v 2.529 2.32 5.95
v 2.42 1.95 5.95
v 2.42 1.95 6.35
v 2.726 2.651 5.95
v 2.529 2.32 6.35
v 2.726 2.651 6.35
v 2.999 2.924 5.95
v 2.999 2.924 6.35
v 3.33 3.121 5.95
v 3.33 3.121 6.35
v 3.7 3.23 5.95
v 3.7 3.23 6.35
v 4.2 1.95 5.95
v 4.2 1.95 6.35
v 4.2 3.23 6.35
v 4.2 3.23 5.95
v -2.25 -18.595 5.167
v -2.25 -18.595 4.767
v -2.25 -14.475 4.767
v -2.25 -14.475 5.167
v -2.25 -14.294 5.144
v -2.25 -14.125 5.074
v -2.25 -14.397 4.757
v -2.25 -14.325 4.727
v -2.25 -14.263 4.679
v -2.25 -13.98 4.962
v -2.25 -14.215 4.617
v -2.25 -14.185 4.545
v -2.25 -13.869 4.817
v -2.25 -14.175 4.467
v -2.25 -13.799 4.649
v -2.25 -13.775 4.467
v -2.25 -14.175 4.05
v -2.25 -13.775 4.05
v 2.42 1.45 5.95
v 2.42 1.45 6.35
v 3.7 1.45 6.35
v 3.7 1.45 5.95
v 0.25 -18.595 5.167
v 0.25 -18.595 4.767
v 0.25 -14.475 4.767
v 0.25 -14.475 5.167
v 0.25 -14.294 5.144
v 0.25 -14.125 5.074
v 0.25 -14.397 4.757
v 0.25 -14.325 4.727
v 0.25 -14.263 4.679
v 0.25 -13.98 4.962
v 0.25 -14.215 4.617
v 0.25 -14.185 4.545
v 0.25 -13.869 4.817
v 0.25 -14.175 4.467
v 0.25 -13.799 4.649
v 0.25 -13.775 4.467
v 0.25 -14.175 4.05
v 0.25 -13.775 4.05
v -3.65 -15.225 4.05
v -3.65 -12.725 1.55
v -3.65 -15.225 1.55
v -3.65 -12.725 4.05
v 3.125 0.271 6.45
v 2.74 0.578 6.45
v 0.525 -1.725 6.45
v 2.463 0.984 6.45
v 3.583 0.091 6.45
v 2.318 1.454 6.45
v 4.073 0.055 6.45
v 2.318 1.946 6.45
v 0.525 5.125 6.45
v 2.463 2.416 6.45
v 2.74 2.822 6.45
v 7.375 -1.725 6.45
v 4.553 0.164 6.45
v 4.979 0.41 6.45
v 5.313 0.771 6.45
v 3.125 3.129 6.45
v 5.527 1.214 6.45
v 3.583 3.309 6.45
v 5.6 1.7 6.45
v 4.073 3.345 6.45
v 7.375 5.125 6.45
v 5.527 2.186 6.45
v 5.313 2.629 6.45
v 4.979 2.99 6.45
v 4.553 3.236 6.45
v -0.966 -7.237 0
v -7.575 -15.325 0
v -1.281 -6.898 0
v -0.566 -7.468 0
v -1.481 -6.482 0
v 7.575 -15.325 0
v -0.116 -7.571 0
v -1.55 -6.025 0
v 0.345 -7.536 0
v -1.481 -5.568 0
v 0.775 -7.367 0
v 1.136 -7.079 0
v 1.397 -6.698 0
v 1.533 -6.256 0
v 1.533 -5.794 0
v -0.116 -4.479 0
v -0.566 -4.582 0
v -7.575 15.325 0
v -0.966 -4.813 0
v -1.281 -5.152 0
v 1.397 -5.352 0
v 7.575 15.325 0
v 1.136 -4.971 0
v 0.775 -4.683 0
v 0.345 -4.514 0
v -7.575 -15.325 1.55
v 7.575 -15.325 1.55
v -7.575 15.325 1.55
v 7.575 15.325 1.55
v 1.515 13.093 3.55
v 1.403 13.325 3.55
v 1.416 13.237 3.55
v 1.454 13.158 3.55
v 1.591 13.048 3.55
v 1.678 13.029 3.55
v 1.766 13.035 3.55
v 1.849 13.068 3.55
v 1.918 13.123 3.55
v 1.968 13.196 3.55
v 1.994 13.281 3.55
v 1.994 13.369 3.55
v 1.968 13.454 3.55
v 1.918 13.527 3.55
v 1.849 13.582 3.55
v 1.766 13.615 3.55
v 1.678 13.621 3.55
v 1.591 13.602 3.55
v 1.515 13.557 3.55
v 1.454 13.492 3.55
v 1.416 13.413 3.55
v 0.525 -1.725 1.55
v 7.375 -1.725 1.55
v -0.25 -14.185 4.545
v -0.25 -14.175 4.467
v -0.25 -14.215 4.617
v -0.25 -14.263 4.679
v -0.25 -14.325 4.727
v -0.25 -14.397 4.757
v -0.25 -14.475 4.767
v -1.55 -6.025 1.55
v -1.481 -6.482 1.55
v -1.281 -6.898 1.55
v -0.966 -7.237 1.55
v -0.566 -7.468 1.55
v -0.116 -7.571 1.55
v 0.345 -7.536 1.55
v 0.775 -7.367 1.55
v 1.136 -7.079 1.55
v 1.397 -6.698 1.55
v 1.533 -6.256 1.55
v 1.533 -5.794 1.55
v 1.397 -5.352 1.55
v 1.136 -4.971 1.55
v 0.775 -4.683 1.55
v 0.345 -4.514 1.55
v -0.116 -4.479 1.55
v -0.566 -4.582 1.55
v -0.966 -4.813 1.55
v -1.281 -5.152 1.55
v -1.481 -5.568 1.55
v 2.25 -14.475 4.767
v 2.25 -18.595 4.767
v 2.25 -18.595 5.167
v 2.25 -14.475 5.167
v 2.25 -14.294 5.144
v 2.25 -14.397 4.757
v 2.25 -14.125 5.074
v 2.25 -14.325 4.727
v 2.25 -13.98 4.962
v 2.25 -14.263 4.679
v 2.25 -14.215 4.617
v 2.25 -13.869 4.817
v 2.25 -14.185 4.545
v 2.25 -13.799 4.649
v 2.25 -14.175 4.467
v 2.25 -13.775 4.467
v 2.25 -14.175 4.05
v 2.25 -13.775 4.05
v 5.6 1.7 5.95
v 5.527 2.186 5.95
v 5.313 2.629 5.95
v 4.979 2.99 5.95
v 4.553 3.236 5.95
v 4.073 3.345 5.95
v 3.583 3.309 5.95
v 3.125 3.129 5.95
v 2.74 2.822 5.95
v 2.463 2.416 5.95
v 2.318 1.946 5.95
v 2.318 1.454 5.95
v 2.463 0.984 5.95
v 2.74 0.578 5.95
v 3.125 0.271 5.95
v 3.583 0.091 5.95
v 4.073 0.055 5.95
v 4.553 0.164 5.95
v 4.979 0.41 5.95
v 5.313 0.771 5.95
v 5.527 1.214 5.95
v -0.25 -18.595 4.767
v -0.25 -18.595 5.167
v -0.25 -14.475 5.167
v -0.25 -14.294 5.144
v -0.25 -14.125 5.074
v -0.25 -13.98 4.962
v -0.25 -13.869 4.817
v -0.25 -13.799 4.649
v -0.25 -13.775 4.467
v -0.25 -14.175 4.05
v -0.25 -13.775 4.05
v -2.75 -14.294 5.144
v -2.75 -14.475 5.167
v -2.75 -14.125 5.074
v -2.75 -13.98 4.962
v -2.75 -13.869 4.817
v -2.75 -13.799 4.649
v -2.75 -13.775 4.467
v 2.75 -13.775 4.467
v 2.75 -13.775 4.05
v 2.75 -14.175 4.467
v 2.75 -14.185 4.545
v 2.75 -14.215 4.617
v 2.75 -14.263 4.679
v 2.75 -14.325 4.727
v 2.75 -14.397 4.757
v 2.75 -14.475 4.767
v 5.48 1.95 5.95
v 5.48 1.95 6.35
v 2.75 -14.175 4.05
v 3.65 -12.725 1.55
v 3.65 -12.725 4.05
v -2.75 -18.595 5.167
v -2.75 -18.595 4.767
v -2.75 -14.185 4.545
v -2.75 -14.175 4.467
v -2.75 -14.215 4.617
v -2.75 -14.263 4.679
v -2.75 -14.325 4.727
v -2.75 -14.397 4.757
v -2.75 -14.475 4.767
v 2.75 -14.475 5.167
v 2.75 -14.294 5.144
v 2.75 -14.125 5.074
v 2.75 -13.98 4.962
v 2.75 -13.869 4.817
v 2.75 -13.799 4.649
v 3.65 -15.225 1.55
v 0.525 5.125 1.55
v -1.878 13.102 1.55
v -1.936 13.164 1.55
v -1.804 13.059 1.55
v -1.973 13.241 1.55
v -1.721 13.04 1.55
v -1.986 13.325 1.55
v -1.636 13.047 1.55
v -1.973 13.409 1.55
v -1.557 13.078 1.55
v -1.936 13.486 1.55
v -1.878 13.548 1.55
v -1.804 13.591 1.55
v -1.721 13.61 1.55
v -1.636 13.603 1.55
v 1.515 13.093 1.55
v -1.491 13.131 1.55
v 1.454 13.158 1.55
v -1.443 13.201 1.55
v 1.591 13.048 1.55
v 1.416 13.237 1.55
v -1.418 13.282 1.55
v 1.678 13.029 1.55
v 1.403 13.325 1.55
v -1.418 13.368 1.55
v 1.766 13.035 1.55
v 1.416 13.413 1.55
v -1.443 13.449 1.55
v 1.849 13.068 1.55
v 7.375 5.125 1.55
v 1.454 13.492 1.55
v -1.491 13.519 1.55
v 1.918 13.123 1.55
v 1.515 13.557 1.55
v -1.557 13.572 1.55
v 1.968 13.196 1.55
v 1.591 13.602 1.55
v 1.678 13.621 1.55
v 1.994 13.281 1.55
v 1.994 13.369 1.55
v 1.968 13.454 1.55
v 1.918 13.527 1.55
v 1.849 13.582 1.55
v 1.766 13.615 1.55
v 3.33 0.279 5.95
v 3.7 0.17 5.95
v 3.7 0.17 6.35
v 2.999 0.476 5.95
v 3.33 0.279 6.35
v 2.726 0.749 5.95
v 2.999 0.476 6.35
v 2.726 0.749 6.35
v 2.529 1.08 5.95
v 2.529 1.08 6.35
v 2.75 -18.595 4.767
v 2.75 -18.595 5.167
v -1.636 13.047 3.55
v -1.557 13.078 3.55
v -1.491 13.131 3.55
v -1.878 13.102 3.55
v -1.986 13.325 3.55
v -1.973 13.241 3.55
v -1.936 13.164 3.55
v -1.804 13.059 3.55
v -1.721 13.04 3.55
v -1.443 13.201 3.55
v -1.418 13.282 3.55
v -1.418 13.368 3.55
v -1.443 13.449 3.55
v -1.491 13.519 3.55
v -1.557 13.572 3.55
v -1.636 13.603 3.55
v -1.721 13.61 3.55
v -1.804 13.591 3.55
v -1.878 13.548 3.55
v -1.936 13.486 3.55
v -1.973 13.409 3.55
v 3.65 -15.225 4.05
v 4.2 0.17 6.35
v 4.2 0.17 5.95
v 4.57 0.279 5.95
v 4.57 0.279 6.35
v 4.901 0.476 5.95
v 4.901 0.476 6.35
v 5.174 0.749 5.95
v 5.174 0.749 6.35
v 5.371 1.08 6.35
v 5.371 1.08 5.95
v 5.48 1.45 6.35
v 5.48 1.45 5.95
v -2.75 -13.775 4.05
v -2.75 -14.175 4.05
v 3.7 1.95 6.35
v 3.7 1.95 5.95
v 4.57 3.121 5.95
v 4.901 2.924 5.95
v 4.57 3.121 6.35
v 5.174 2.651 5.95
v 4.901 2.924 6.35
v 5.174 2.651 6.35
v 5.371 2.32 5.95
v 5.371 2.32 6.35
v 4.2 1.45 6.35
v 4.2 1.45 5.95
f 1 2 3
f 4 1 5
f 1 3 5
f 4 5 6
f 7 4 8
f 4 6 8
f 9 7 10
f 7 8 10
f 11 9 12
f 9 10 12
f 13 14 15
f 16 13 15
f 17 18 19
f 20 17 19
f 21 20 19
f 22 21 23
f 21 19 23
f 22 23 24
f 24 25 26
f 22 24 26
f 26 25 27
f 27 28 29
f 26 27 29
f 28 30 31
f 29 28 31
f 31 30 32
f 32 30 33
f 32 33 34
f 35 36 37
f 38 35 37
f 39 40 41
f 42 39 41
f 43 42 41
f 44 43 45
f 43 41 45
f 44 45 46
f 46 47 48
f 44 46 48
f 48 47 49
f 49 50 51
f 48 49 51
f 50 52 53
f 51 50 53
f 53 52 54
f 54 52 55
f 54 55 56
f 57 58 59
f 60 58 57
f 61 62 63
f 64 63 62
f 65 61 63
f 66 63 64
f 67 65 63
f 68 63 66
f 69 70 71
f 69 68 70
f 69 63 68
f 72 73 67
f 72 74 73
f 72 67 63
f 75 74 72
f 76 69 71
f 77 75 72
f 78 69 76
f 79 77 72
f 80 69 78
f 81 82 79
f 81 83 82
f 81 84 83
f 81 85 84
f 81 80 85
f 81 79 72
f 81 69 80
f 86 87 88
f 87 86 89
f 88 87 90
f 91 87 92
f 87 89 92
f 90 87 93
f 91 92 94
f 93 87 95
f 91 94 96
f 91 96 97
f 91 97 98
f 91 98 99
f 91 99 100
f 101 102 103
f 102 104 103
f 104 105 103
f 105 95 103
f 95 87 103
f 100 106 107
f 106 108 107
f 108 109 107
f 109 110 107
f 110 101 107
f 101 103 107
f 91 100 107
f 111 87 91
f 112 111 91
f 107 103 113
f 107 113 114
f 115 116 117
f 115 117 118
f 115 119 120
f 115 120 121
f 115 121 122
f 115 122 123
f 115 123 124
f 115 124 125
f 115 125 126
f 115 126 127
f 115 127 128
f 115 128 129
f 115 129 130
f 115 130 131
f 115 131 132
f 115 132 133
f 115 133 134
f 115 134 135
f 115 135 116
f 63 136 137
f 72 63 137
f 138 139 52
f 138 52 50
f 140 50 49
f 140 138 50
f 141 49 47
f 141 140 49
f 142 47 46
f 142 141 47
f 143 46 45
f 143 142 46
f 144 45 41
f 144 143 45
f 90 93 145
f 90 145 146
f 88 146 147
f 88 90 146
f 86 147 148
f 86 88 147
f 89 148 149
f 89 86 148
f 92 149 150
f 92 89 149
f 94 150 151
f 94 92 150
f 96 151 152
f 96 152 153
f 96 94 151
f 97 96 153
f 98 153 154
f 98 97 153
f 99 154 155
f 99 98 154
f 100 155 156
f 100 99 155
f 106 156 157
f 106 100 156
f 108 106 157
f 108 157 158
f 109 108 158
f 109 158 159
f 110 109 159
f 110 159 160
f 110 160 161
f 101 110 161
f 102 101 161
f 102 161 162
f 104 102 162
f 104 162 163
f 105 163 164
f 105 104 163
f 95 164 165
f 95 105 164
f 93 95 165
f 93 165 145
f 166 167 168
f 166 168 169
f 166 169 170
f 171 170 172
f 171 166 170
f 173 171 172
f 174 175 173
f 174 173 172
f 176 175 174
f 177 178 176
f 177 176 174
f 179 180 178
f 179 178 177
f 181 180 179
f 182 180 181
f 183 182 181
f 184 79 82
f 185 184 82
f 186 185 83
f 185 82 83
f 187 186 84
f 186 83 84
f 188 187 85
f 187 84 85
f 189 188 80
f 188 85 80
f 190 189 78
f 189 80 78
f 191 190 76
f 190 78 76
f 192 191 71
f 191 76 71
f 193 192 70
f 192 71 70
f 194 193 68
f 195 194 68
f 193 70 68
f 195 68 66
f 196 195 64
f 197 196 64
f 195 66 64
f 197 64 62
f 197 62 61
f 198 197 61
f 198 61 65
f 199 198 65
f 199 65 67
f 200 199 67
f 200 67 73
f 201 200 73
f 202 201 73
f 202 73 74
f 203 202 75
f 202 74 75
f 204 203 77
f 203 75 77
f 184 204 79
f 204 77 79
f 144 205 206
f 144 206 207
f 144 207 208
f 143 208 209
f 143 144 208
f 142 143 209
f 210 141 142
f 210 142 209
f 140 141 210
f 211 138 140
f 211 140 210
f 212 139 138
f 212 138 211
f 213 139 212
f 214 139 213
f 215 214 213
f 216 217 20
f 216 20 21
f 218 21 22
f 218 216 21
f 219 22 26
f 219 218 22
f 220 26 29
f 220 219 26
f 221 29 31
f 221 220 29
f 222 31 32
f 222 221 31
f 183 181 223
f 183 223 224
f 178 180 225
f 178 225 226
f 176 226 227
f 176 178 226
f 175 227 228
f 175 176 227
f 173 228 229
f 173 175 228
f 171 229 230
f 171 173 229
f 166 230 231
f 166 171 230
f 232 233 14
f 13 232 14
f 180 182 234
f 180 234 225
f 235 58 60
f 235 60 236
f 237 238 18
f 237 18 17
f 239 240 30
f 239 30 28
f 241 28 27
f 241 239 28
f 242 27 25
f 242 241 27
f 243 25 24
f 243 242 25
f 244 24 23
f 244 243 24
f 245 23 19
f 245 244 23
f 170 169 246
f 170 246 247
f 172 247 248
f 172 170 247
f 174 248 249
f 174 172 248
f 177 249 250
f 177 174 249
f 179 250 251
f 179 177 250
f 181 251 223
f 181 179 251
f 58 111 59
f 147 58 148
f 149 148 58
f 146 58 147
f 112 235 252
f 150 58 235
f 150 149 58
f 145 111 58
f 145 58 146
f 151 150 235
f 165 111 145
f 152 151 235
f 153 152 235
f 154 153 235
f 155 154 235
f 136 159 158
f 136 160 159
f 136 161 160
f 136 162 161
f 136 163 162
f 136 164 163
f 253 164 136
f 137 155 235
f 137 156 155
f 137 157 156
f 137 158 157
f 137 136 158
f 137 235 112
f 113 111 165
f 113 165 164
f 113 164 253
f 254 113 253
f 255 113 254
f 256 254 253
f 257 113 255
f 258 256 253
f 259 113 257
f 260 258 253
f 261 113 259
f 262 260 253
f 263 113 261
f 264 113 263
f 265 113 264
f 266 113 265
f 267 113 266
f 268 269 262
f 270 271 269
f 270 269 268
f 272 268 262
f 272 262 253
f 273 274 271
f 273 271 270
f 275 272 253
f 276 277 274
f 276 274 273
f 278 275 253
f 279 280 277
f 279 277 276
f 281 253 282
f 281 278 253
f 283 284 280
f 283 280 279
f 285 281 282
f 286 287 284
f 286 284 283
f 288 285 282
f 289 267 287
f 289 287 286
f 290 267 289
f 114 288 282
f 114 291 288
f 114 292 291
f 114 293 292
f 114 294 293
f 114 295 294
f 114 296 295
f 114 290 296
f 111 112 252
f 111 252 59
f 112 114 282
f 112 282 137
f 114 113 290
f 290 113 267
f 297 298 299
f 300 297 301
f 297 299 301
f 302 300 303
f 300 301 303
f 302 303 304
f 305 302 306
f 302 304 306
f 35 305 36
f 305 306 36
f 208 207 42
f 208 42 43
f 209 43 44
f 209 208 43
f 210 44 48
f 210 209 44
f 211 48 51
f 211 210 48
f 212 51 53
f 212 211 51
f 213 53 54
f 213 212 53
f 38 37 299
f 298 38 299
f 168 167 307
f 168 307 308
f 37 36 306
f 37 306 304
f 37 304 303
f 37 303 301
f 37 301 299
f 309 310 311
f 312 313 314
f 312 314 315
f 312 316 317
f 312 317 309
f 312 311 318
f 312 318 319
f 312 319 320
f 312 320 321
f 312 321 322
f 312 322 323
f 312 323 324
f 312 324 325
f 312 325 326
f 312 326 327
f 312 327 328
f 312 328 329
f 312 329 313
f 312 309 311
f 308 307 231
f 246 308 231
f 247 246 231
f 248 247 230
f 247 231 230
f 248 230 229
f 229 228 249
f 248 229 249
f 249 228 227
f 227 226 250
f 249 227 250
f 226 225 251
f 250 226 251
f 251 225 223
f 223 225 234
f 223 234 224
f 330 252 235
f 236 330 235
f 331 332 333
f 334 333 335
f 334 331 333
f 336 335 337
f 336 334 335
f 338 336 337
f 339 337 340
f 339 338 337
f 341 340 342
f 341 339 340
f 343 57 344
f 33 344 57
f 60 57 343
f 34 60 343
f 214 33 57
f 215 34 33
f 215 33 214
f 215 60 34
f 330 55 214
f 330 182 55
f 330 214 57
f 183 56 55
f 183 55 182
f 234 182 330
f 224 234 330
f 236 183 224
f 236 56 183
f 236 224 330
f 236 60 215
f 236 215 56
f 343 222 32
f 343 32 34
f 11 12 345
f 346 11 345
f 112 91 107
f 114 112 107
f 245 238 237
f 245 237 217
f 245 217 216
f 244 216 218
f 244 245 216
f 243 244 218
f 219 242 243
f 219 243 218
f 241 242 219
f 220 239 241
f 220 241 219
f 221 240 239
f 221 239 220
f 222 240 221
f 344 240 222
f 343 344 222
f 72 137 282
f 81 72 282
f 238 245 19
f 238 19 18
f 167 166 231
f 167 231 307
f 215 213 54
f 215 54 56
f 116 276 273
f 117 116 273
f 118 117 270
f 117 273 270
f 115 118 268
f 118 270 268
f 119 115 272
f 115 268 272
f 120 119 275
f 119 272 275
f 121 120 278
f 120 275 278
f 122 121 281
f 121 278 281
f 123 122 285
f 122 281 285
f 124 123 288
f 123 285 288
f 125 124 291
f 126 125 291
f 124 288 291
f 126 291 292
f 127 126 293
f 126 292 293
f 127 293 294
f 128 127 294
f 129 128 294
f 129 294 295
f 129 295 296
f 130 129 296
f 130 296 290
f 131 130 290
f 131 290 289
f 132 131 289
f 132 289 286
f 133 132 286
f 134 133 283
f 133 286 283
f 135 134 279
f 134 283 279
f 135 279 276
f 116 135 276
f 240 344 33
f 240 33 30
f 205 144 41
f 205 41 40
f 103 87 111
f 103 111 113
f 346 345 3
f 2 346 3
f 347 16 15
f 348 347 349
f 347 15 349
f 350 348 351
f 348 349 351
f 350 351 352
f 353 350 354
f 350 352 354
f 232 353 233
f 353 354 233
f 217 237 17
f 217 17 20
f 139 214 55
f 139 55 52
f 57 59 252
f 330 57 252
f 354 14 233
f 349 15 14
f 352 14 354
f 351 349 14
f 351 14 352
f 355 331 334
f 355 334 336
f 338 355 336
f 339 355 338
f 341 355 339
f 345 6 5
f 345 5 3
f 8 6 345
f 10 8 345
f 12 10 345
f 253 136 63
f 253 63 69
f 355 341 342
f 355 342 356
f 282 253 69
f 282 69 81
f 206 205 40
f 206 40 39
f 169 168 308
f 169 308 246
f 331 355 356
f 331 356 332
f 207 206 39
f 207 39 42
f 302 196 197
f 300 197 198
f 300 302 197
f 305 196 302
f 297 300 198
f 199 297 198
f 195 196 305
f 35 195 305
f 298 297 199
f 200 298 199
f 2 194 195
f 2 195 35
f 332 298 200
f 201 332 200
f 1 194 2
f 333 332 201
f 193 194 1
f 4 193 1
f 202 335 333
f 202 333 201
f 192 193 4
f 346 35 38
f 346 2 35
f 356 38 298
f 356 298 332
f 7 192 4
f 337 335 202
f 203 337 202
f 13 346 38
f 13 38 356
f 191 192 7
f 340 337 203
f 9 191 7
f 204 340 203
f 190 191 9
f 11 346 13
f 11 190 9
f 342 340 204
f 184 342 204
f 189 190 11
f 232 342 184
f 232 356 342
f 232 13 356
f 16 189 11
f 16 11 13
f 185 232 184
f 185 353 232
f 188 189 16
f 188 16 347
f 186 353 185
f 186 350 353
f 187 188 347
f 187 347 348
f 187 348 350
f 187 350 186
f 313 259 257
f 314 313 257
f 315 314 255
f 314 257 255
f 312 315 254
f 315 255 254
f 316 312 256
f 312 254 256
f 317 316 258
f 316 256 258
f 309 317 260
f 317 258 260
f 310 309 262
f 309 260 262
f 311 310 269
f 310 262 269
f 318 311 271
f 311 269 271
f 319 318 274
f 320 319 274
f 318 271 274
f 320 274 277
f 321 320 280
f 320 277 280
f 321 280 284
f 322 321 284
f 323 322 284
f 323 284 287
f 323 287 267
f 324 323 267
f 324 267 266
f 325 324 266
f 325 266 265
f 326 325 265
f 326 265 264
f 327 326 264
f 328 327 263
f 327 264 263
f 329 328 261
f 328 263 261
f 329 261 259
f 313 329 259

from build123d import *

# Parameters (mm, degrees)
ESBO_O1_W                = 15.15
ESBO_O1_H                = 30.65
ESBO_O1_R                = 1.55
RESSALTO_EXTRUS_O1_DEPTH = 1.55
ESBO_O2_W                = 6.85
ESBO_O2_H                = 6.85
RESSALTO_EXTRUS_O2_DEPTH = 6.45
ESBO_O3_R                = 1.65
CORTE_EXTRUS_O1_DEPTH    = 0.5
ESBO_O4_W                = 7.3
ESBO_O4_H                = 2.5
RESSALTO_EXTRUS_O3_DEPTH = 4.05
RESSALTO_EXTRUS_O5_DEPTH = 7.398508
ESBO_O12_W               = 1.34798559
ESBO_O12_H               = 5.991047065
ESBO_O12_W_2             = 0.998507844
ESBO_O12_W_3             = 2
CORTE_EXTRUS_O2_DEPTH    = 10
ESBO_O9_R                = 1.55
CORTE_EXTRUS_O3_DEPTH    = 0.1
ESBO_O15_R               = 0.297205441
ESBO_O15_R_2             = 0.285630525
RESSALTO_EXTRUS_O6_DEPTH = 2


with BuildPart() as part:
    # Esboço1 → Ressalto-extrusão1 (new body)
    with BuildSketch(Plane.XY):
        Rectangle(ESBO_O1_W, ESBO_O1_H)
        with Locations(Location((0, -6.025, 0), (0, 0, 180))):
            Circle(ESBO_O1_R, mode=Mode.SUBTRACT)
    extrude(amount=RESSALTO_EXTRUS_O1_DEPTH)

    # Esboço2 → Ressalto-extrusão2 (add)
    with BuildSketch(Plane.XY):
        with Locations((3.95, 1.7)):
            Rectangle(ESBO_O2_W, ESBO_O2_H)
    extrude(amount=RESSALTO_EXTRUS_O2_DEPTH)

    # Esboço3 → Corte-extrusão1 (cut)
    with BuildSketch(Plane.XY.offset(6.45)):
        with Locations((3.95, 1.7)):
            Circle(ESBO_O3_R)
        with BuildLine():
            Line((3.7, 1.95), (2.420294146, 1.95))
            ThreePointArc((2.420294146, 1.95), (2.853984489, 2.796015511), (3.7, 3.229705854))
            Line((3.7, 3.229705854), (3.7, 1.95))
        make_face(mode=Mode.SUBTRACT)
        with BuildLine():
            Line((5.479705854, 1.45), (4.2, 1.45))
            Line((4.2, 1.45), (4.2, 0.170294146))
            ThreePointArc((4.2, 0.170294146), (5.046015511, 0.603984489), (5.479705854, 1.45))
        make_face(mode=Mode.SUBTRACT)
        with BuildLine():
            Line((5.479705854, 1.95), (4.2, 1.95))
            Line((4.2, 1.95), (4.2, 3.229705854))
            ThreePointArc((4.2, 3.229705854), (5.046015511, 2.796015511), (5.479705854, 1.95))
        make_face(mode=Mode.SUBTRACT)
        with BuildLine():
            Line((3.7, 1.45), (3.7, 0.170294146))
            ThreePointArc((3.7, 0.170294146), (2.853984489, 0.603984489), (2.420294146, 1.45))
            Line((2.420294146, 1.45), (3.7, 1.45))
        make_face(mode=Mode.SUBTRACT)
    extrude(amount=-CORTE_EXTRUS_O1_DEPTH, mode=Mode.SUBTRACT)

    # Esboço4 → Ressalto-extrusão3 (add)
    with BuildSketch(Plane.XY):
        with Locations((0, -13.975)):
            Rectangle(ESBO_O4_W, ESBO_O4_H)
    extrude(amount=RESSALTO_EXTRUS_O3_DEPTH)

    # Esboço11 → Ressalto-extrusão5 (add)
    with BuildSketch(Plane.ZY.offset(3.65)):
        with BuildLine():
            Line((4.05, -14.175), (4.467357012, -14.175))
            ThreePointArc((4.467357012, -14.175), (4.679489046, -14.262867966), (4.767357012, -14.475))
            Line((4.767357012, -14.475), (4.767357012, -18.595051461))
            Line((4.767357012, -18.595051461), (5.167357012, -18.595051461))
            Line((5.167357012, -18.595051461), (5.167357012, -14.475))
            ThreePointArc((5.167357012, -14.475), (4.962331759, -13.980025253), (4.467357012, -13.775))
            Line((4.467357012, -13.775), (4.05, -13.775))
            Line((4.05, -13.775), (4.05, -14.175))
        make_face()
    extrude(amount=-RESSALTO_EXTRUS_O5_DEPTH)

    # Esboço12 → Corte-extrusão2 (cut)
    with BuildSketch(Plane.XY.offset(4.05)):
        with Locations((-3.423992795, -16.372351479)):
            Rectangle(ESBO_O12_W, ESBO_O12_H)
        with Locations((3.249253922, -16.372351479)):
            Rectangle(ESBO_O12_W_2, ESBO_O12_H)
        with Locations((-1.25, -16.372351479)):
            Rectangle(ESBO_O12_W_3, ESBO_O12_H)
        with Locations((1.25, -16.372351479)):
            Rectangle(ESBO_O12_W_3, ESBO_O12_H)
    extrude(amount=CORTE_EXTRUS_O2_DEPTH, mode=Mode.SUBTRACT)

    # Esboço9 → Corte-extrusão3 (cut)
    with BuildSketch(Plane.XY.offset(6.45)):
        with Locations((3.95, 1.7)):
            Circle(ESBO_O9_R)
    extrude(amount=-CORTE_EXTRUS_O3_DEPTH, mode=Mode.SUBTRACT)

    # Esboço15 → Ressalto-extrusão6 (add)
    with BuildSketch(Plane.XY.offset(1.55)):
        with Locations(Location((1.7, 13.325, 0), (0, 0, 180))):
            Circle(ESBO_O15_R)
        with Locations(Location((-1.7, 13.325, 0), (0, 0, 180))):
            Circle(ESBO_O15_R_2)
    extrude(amount=RESSALTO_EXTRUS_O6_DEPTH)


solid = part.part
